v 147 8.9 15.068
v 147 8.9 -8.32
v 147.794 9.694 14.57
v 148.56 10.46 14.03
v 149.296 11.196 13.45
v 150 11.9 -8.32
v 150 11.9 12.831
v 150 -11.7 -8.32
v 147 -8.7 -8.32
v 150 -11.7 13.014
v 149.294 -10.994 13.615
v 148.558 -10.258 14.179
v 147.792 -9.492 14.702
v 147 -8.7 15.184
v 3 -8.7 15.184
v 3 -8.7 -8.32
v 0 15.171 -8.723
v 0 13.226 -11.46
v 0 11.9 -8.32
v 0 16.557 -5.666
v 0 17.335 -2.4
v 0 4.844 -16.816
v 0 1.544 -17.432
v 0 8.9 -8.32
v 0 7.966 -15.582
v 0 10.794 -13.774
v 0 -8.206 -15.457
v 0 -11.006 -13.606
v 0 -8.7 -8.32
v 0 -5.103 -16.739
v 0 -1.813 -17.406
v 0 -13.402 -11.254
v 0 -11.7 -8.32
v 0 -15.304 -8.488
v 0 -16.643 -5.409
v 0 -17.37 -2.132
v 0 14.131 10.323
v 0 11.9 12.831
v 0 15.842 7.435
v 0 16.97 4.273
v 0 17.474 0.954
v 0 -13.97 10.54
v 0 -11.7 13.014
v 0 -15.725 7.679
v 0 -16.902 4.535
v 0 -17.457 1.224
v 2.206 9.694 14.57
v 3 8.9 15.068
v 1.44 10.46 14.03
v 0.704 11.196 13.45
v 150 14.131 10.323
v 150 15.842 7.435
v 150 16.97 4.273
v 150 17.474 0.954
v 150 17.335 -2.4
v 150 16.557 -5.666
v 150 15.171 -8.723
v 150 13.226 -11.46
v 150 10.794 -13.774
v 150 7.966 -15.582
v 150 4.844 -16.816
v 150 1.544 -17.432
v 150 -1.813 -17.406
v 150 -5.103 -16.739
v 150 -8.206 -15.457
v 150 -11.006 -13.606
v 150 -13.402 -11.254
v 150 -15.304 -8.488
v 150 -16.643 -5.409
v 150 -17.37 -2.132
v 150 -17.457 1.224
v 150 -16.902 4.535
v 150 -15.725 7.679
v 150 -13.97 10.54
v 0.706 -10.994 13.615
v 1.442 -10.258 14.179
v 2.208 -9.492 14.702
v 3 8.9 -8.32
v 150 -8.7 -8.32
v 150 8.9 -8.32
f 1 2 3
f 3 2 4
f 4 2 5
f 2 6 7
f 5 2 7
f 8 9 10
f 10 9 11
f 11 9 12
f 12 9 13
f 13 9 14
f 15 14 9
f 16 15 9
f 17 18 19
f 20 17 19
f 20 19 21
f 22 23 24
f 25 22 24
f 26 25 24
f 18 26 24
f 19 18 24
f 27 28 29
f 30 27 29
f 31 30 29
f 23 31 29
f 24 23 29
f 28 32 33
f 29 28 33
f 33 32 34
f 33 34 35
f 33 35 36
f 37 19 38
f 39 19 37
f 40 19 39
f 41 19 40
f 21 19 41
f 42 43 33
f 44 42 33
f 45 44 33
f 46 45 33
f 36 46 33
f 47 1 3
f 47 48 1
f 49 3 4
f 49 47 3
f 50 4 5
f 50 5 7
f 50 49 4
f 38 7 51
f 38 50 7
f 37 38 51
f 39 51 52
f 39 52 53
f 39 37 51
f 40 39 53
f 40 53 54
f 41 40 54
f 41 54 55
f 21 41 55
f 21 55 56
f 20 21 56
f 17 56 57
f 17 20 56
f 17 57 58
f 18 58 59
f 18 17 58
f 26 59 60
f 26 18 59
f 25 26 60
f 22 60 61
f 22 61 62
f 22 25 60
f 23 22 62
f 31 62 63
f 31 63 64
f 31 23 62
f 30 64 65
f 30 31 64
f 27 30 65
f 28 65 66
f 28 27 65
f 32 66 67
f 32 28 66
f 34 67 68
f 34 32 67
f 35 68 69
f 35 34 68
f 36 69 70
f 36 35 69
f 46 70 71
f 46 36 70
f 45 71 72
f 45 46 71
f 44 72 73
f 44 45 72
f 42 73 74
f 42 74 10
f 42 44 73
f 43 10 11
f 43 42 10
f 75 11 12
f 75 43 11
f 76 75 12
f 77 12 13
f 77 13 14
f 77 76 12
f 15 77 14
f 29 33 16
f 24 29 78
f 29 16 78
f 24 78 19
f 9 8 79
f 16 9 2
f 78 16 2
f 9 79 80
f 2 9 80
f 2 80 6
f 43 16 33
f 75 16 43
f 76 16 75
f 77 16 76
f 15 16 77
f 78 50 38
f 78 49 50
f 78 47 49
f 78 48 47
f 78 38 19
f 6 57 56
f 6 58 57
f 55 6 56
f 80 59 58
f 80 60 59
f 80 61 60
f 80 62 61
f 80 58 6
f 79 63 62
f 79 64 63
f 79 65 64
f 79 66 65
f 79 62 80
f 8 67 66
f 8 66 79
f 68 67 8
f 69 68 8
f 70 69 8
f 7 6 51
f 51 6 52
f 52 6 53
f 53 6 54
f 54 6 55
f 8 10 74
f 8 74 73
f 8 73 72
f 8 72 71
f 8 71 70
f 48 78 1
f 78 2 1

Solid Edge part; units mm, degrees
sketch "Sketch1" plane through (0, 0, 0) normal (1, 0, 0) x (0, 1, 0)
  circle A0 centre (0, 0) radius 17.5
extrude "Protrusion1" add sketch "Sketch1" along normal blind 150
sketch "Sketch2" plane through (150, 0, 0) normal (1, 0, 0) x (0, 1, 0)
  line L0 (8.9, -8.32) -> (8.9, 21.68)
  line L1 (8.9, 21.68) -> (-8.7, 21.68)
  line L2 (-8.7, 21.68) -> (-8.7, -8.32)
  line L3 (-8.7, -8.32) -> (8.9, -8.32)
extrude "ExtrudedCutout_1" cut sketch "Sketch2" against normal blind 150
chamfer "Chamfer_1" distance 3 angle 45 4 edges at (150, 8.9, 3.3739) (150, -8.7, 3.4321) (0, 8.9, 3.3739) (0, -8.7, 3.4321)
